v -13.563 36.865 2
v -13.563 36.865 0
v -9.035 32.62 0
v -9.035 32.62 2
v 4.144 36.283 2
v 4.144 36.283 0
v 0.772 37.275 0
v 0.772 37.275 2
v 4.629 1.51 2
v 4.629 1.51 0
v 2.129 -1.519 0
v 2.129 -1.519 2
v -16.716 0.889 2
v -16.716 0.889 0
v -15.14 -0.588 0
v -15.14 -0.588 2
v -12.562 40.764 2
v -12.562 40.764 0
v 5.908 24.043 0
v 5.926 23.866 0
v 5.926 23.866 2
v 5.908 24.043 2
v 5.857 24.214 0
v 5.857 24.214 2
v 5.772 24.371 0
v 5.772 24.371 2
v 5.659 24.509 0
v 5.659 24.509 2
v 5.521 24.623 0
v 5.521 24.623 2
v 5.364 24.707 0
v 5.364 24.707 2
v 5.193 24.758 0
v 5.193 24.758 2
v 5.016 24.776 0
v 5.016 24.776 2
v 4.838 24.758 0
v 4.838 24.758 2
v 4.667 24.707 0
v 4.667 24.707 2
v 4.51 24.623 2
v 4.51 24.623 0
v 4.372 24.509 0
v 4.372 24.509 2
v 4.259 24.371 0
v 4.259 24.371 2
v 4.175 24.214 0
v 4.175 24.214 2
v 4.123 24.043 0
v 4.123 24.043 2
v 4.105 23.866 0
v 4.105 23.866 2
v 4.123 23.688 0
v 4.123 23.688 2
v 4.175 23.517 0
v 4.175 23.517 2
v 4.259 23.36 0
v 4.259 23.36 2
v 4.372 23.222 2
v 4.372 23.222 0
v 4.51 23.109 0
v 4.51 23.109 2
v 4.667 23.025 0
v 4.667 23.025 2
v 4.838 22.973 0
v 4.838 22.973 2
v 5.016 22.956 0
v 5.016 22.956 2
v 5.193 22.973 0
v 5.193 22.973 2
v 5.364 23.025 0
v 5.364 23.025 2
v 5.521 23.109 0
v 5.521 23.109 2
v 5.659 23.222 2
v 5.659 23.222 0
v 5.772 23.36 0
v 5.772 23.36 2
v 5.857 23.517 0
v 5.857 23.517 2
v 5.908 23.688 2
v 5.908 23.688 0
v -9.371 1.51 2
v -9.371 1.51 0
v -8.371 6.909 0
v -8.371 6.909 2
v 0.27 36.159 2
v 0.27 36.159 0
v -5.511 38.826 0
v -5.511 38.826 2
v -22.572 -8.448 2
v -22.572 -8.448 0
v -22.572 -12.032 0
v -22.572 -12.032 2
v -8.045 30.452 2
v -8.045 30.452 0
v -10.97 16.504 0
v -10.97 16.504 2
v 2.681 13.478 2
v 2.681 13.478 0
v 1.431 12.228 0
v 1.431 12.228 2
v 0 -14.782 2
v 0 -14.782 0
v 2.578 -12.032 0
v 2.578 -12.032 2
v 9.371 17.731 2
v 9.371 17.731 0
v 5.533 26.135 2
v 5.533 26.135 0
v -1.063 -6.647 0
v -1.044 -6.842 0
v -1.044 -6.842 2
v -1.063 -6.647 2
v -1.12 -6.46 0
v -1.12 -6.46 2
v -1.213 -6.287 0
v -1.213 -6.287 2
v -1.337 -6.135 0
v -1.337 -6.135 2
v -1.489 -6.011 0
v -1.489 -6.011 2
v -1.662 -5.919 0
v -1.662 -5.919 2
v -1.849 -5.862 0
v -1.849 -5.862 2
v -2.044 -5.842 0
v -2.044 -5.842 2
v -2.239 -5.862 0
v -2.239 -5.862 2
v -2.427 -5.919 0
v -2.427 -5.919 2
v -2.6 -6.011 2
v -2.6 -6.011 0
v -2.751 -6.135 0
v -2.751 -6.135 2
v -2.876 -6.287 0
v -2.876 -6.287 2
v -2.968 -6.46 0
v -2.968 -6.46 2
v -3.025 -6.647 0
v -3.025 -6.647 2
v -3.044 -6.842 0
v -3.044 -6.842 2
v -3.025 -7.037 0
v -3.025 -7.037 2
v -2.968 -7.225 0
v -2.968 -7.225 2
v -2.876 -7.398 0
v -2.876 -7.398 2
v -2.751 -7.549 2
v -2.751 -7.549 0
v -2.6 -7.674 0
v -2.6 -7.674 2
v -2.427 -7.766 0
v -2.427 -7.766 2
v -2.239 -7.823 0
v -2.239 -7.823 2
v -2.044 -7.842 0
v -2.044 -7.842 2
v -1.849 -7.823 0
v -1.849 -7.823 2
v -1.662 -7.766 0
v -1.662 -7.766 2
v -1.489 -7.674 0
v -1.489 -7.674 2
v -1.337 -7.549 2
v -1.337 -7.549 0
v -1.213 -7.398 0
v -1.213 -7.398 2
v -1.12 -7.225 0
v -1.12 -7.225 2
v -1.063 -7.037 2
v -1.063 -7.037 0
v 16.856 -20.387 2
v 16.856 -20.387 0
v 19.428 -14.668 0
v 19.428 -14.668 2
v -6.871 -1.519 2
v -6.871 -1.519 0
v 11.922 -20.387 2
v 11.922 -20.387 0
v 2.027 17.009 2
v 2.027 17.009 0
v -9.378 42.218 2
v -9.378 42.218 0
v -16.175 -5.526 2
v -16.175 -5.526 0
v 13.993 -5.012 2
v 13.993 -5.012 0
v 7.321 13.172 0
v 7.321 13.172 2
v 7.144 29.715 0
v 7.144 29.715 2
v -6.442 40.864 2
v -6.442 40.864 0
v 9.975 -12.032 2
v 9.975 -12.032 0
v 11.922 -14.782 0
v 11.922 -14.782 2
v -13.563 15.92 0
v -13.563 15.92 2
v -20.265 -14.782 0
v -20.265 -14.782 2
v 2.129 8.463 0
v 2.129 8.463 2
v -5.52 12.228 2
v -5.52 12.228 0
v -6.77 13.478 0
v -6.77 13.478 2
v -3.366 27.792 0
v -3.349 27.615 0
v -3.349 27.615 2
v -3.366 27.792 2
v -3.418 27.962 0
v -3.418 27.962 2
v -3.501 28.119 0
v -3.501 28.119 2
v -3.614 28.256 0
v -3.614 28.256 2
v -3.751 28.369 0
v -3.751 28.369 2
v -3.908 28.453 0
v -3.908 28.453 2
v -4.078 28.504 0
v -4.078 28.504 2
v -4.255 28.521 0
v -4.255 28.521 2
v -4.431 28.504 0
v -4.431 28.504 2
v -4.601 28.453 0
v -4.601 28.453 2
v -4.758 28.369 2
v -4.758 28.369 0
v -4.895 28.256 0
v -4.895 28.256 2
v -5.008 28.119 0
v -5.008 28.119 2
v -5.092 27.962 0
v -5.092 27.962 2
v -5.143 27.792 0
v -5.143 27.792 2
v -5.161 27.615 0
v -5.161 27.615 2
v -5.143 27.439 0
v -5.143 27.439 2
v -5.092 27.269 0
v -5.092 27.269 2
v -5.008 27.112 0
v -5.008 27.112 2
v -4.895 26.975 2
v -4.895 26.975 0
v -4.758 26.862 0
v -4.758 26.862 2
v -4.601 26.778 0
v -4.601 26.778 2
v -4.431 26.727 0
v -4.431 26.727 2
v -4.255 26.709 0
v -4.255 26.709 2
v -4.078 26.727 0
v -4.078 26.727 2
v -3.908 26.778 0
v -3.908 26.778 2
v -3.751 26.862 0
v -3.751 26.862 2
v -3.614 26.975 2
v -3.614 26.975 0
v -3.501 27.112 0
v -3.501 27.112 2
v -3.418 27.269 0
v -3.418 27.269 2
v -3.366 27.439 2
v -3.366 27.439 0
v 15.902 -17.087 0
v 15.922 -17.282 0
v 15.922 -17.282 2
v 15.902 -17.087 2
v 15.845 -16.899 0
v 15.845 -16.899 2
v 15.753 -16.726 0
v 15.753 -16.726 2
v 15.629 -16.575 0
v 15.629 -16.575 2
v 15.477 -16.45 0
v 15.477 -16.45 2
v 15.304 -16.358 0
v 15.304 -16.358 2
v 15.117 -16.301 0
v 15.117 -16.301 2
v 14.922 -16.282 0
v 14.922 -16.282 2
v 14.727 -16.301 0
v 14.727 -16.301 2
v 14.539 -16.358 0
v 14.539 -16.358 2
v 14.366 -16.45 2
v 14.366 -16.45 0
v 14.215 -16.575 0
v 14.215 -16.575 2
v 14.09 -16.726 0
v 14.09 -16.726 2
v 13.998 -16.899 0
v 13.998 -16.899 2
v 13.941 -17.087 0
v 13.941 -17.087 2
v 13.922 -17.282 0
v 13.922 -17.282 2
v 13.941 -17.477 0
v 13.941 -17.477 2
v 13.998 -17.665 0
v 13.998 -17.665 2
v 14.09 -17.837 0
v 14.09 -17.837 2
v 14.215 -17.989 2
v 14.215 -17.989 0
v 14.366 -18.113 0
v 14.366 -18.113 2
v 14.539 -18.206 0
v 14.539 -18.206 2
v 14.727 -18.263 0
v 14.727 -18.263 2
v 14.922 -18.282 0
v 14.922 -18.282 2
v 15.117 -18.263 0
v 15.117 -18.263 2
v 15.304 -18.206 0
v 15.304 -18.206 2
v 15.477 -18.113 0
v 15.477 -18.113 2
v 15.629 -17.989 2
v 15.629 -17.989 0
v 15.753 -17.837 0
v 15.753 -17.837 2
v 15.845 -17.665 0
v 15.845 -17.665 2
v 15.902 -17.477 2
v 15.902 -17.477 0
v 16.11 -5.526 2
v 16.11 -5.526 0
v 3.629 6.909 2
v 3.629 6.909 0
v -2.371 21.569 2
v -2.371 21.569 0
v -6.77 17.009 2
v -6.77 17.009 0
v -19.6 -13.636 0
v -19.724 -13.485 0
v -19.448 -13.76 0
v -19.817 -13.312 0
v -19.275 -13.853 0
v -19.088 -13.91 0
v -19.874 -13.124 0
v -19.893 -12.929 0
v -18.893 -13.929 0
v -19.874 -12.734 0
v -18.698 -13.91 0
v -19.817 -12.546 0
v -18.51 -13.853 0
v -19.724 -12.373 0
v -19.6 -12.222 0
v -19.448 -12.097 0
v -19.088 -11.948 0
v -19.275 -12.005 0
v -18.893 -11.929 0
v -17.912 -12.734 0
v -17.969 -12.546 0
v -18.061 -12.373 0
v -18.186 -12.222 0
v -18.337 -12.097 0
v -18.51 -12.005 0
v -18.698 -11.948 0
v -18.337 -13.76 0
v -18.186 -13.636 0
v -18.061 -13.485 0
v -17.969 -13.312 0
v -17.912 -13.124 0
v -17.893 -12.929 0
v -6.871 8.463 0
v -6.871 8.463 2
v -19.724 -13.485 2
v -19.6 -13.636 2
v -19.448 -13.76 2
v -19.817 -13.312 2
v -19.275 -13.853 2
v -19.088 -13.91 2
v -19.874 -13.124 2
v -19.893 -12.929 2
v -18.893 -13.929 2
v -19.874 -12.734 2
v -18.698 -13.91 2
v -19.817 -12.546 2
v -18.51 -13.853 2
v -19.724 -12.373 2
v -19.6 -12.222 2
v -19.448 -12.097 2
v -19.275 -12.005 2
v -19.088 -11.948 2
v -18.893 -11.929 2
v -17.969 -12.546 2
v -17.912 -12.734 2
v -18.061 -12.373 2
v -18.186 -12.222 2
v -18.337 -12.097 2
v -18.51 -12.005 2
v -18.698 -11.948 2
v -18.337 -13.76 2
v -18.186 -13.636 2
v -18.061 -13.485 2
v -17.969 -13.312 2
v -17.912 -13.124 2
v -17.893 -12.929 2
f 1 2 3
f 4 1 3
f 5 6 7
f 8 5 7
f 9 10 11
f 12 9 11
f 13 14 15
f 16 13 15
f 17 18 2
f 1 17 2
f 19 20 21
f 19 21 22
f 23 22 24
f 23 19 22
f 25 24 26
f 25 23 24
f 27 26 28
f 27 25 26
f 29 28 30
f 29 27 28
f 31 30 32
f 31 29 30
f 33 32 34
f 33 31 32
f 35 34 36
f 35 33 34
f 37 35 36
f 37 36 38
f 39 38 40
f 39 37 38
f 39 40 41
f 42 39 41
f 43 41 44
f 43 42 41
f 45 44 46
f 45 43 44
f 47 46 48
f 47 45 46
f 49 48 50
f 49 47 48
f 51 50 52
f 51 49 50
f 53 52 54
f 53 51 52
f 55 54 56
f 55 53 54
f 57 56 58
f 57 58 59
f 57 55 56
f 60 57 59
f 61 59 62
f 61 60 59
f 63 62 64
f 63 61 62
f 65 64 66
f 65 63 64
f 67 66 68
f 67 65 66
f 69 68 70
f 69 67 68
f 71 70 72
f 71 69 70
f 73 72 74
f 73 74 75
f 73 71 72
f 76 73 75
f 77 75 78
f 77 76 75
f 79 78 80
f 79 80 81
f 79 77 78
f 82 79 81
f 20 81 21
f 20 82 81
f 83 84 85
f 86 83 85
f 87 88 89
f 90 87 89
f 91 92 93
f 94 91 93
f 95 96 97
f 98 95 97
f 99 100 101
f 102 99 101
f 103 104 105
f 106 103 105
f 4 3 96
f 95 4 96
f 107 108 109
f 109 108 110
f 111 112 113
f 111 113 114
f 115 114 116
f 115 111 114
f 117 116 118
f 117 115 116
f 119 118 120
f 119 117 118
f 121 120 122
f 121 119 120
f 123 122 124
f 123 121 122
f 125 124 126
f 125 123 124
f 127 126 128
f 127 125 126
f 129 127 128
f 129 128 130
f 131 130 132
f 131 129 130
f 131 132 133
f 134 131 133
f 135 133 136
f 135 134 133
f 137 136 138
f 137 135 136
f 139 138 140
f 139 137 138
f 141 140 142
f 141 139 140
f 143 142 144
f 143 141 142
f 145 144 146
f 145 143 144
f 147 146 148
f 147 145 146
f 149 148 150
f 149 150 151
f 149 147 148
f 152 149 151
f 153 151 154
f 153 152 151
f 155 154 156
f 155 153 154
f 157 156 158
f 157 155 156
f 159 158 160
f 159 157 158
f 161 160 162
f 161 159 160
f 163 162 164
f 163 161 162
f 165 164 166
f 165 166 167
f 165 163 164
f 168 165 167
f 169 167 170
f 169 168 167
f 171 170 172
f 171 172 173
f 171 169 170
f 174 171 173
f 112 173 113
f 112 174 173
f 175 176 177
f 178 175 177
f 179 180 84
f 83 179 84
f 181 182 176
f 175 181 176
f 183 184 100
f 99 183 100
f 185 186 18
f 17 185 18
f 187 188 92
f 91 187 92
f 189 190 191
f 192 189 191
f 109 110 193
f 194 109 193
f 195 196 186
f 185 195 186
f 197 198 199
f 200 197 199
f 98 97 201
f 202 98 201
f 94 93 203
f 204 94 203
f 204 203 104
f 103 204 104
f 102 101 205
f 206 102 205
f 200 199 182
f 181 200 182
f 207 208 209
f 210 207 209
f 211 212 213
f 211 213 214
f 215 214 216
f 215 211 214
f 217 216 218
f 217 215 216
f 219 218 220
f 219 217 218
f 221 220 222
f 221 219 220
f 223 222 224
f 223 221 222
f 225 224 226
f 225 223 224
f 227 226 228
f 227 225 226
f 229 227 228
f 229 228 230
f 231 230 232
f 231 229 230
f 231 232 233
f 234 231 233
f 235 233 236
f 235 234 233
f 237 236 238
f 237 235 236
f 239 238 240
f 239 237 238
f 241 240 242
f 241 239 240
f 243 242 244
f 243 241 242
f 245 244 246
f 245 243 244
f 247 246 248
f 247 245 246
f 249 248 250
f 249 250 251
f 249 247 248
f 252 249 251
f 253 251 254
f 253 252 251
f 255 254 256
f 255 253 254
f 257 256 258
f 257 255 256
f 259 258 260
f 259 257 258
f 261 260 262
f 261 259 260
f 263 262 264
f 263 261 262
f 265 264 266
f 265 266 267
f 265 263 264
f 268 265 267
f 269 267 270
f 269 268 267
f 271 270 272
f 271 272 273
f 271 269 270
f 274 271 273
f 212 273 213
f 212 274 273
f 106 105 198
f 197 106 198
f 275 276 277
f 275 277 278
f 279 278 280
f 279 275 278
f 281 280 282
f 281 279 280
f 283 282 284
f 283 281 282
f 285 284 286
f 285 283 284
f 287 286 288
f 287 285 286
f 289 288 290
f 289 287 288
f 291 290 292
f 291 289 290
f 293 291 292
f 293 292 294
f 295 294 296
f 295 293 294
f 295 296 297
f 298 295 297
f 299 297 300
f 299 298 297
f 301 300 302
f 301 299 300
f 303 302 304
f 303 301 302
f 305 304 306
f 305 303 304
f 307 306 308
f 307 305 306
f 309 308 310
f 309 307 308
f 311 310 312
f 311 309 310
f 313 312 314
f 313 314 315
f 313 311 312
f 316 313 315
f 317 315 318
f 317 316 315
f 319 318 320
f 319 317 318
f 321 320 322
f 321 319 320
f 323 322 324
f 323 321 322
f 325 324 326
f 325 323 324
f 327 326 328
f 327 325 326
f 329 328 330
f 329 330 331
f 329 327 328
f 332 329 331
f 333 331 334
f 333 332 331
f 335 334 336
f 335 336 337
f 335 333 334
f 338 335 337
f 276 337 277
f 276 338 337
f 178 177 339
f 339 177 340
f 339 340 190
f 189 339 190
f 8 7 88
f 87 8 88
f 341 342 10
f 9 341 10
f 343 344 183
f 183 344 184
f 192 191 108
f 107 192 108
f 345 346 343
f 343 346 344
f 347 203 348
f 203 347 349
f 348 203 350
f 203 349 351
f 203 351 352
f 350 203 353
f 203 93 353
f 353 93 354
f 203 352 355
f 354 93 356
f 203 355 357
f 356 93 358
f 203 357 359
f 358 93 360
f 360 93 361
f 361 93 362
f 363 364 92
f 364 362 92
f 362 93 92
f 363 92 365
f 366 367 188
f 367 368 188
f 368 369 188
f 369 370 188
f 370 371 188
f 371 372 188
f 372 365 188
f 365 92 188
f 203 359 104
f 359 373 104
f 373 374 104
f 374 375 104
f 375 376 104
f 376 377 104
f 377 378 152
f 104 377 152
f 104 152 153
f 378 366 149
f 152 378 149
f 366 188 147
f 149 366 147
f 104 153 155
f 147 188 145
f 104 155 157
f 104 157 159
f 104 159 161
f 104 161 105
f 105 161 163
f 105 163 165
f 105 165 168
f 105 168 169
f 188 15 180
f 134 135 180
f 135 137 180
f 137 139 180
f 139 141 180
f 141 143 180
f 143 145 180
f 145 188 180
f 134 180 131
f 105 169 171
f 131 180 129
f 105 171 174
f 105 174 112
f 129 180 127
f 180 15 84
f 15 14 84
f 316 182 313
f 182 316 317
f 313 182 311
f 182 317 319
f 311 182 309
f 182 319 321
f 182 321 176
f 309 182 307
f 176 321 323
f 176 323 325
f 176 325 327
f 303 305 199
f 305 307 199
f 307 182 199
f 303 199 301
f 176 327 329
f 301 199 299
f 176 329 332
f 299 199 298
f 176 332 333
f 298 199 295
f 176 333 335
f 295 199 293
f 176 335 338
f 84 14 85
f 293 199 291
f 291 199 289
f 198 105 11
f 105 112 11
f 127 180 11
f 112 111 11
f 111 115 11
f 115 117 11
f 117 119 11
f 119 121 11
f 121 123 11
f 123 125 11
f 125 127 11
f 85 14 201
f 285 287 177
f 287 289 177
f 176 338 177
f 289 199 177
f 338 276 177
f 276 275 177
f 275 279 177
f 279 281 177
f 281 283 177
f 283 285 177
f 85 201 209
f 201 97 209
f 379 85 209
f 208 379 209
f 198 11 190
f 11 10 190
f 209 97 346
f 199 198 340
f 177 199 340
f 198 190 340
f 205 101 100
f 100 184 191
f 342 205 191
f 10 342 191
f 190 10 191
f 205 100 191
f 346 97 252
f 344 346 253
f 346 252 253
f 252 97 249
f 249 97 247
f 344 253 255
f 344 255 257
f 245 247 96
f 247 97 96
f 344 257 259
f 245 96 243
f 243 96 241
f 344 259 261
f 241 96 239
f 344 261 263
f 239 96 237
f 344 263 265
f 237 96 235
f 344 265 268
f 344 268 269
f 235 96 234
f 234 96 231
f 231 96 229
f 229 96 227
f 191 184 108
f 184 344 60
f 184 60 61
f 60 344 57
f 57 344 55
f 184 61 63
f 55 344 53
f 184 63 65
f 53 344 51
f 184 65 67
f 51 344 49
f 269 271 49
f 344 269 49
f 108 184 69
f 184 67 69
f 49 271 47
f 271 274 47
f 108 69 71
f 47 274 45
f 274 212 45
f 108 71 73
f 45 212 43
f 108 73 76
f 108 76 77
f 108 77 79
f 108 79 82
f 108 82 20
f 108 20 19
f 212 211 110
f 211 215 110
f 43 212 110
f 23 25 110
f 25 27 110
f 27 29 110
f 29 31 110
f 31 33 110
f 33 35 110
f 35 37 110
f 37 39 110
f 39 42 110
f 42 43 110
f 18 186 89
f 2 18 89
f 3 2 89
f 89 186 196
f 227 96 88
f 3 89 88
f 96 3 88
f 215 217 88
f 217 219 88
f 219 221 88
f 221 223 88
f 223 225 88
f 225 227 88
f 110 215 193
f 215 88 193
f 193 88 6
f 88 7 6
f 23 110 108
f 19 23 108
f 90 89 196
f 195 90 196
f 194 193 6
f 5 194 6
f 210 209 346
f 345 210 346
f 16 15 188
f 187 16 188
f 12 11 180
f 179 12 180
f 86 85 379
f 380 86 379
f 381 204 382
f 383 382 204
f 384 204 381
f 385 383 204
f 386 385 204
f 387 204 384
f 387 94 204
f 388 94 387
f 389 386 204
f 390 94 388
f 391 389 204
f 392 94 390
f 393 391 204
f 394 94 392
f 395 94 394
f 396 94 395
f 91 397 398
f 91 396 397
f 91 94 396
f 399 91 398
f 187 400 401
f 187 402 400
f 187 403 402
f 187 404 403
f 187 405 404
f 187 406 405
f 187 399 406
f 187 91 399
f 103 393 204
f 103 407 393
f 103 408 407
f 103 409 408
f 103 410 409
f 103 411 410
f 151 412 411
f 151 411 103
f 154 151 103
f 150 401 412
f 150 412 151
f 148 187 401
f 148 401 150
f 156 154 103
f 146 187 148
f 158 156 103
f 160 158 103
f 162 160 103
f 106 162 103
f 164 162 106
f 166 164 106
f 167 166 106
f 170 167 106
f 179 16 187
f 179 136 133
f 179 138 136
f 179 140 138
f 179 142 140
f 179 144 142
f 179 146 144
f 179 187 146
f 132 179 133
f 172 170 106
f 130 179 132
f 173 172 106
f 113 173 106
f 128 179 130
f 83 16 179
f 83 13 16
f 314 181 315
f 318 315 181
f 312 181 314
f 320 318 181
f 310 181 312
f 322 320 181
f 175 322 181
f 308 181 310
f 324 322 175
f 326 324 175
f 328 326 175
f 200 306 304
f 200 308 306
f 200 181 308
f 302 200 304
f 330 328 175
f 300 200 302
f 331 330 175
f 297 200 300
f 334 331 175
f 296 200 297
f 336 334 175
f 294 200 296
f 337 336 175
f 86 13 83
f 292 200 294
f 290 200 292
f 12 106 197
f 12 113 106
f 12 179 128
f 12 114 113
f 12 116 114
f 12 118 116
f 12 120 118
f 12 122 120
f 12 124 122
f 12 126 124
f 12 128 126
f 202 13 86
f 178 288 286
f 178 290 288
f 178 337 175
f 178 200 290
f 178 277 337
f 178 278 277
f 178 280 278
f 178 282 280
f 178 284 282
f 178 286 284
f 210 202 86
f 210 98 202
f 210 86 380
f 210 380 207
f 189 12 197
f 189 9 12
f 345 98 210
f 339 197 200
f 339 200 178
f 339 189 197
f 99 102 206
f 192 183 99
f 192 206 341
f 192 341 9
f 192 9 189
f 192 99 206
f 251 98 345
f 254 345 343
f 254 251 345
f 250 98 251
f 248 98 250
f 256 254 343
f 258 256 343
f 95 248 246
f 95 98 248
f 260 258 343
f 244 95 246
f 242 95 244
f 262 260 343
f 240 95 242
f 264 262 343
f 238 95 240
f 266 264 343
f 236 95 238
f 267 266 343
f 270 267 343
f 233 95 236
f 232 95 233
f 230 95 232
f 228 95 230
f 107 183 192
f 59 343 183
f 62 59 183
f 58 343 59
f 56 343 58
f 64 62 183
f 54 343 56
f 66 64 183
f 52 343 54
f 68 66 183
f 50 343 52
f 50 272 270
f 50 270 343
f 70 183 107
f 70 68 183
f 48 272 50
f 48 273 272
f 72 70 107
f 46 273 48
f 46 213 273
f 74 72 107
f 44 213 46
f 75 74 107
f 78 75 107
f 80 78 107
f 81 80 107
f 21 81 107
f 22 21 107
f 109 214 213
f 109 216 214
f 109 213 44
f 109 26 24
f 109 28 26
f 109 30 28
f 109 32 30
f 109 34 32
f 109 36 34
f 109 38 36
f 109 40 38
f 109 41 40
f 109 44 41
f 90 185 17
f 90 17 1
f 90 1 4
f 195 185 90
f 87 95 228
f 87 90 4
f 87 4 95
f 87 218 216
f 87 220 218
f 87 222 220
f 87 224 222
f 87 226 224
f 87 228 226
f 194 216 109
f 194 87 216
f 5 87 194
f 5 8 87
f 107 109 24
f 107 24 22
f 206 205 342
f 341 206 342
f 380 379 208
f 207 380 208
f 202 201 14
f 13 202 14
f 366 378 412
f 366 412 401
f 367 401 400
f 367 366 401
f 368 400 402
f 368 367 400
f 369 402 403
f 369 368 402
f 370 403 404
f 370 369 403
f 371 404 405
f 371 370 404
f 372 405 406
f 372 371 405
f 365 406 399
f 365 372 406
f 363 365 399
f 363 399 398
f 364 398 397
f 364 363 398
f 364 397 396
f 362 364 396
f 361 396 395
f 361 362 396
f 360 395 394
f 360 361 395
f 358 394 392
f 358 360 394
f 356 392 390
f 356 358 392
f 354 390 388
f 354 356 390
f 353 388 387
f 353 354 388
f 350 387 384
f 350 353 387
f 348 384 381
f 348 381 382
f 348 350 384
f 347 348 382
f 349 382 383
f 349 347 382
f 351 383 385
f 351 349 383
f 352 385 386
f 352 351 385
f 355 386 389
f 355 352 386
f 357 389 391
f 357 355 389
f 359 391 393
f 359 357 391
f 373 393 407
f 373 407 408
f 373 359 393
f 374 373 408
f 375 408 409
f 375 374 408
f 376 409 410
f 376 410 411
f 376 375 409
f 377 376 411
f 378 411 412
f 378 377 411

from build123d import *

# Parameters (mm, degrees)
SKETCH1_R           = 1
SKETCH1_R_2         = 0.910218414
SKETCH1_R_3         = 0.906034418
BOSS_EXTRUDE1_DEPTH = 2


with BuildPart() as part:
    # Sketch1 → Boss-Extrude1 (new body)
    with BuildSketch(Plane.XY):
        Polygon((-20.265114669, -14.781853255), (0, -14.781853255), (2.578230219, -12.031741021), (9.974883423, -12.031741021), (11.921608737, -14.781853255), (11.921608737, -20.387219314), (16.856252033, -20.387219314), (19.428429521, -14.668134436), (16.109635951, -5.526454973), (13.99339942, -5.01215501), (7.32119149, 13.172265413), (9.371469902, 17.730938487), (5.533408169, 26.134970212), (7.143643167, 29.715232721), (4.143999648, 36.283417669), (0.771614698, 37.274543445), (0.269863196, 36.158928585), (-5.511384257, 38.825843561), (-6.442002374, 40.863576334), (-9.378393977, 42.218146745), (-12.56174706, 40.764331952), (-13.563489591, 36.865253111), (-9.034751731, 32.619561367), (-8.044765523, 30.451832945), (-10.970070519, 16.504069812), (-13.563489591, 15.919840508), (-16.715889982, 0.889293603), (-15.139689787, -0.58839408), (-16.175363684, -5.526454973), (-22.571570479, -8.447557289), (-22.571570479, -12.031741021), align=None)
        with Locations((-18.892731675, -12.928934576)):
            Circle(SKETCH1_R, mode=Mode.SUBTRACT)
        with Locations((14.921608737, -17.281853255)):
            Circle(SKETCH1_R, mode=Mode.SUBTRACT)
        with Locations((-2.044247077, -6.842384565)):
            Circle(SKETCH1_R, mode=Mode.SUBTRACT)
        with Locations((5.01567612, 23.865741995)):
            Circle(SKETCH1_R_2, mode=Mode.SUBTRACT)
        with Locations((-4.254696048, 27.615435298)):
            Circle(SKETCH1_R_3, mode=Mode.SUBTRACT)
        Polygon((2.128672216, -1.518848285), (-6.871327784, -1.518848285), (-9.371327784, 1.510447631), (-8.371327784, 6.908565954), (-6.871327784, 8.46349525), (-5.519746073, 12.22825254), (-6.7697323, 13.478238768), (-6.7697323, 17.009479478), (-2.371327784, 21.568951505), (2.027076733, 17.009479478), (2.681238146, 13.478238768), (1.431251918, 12.22825254), (2.128672216, 8.46349525), (3.628672216, 6.908565954), (4.628672216, 1.510447631), align=None, mode=Mode.SUBTRACT)
    extrude(amount=BOSS_EXTRUDE1_DEPTH)


solid = part.part
